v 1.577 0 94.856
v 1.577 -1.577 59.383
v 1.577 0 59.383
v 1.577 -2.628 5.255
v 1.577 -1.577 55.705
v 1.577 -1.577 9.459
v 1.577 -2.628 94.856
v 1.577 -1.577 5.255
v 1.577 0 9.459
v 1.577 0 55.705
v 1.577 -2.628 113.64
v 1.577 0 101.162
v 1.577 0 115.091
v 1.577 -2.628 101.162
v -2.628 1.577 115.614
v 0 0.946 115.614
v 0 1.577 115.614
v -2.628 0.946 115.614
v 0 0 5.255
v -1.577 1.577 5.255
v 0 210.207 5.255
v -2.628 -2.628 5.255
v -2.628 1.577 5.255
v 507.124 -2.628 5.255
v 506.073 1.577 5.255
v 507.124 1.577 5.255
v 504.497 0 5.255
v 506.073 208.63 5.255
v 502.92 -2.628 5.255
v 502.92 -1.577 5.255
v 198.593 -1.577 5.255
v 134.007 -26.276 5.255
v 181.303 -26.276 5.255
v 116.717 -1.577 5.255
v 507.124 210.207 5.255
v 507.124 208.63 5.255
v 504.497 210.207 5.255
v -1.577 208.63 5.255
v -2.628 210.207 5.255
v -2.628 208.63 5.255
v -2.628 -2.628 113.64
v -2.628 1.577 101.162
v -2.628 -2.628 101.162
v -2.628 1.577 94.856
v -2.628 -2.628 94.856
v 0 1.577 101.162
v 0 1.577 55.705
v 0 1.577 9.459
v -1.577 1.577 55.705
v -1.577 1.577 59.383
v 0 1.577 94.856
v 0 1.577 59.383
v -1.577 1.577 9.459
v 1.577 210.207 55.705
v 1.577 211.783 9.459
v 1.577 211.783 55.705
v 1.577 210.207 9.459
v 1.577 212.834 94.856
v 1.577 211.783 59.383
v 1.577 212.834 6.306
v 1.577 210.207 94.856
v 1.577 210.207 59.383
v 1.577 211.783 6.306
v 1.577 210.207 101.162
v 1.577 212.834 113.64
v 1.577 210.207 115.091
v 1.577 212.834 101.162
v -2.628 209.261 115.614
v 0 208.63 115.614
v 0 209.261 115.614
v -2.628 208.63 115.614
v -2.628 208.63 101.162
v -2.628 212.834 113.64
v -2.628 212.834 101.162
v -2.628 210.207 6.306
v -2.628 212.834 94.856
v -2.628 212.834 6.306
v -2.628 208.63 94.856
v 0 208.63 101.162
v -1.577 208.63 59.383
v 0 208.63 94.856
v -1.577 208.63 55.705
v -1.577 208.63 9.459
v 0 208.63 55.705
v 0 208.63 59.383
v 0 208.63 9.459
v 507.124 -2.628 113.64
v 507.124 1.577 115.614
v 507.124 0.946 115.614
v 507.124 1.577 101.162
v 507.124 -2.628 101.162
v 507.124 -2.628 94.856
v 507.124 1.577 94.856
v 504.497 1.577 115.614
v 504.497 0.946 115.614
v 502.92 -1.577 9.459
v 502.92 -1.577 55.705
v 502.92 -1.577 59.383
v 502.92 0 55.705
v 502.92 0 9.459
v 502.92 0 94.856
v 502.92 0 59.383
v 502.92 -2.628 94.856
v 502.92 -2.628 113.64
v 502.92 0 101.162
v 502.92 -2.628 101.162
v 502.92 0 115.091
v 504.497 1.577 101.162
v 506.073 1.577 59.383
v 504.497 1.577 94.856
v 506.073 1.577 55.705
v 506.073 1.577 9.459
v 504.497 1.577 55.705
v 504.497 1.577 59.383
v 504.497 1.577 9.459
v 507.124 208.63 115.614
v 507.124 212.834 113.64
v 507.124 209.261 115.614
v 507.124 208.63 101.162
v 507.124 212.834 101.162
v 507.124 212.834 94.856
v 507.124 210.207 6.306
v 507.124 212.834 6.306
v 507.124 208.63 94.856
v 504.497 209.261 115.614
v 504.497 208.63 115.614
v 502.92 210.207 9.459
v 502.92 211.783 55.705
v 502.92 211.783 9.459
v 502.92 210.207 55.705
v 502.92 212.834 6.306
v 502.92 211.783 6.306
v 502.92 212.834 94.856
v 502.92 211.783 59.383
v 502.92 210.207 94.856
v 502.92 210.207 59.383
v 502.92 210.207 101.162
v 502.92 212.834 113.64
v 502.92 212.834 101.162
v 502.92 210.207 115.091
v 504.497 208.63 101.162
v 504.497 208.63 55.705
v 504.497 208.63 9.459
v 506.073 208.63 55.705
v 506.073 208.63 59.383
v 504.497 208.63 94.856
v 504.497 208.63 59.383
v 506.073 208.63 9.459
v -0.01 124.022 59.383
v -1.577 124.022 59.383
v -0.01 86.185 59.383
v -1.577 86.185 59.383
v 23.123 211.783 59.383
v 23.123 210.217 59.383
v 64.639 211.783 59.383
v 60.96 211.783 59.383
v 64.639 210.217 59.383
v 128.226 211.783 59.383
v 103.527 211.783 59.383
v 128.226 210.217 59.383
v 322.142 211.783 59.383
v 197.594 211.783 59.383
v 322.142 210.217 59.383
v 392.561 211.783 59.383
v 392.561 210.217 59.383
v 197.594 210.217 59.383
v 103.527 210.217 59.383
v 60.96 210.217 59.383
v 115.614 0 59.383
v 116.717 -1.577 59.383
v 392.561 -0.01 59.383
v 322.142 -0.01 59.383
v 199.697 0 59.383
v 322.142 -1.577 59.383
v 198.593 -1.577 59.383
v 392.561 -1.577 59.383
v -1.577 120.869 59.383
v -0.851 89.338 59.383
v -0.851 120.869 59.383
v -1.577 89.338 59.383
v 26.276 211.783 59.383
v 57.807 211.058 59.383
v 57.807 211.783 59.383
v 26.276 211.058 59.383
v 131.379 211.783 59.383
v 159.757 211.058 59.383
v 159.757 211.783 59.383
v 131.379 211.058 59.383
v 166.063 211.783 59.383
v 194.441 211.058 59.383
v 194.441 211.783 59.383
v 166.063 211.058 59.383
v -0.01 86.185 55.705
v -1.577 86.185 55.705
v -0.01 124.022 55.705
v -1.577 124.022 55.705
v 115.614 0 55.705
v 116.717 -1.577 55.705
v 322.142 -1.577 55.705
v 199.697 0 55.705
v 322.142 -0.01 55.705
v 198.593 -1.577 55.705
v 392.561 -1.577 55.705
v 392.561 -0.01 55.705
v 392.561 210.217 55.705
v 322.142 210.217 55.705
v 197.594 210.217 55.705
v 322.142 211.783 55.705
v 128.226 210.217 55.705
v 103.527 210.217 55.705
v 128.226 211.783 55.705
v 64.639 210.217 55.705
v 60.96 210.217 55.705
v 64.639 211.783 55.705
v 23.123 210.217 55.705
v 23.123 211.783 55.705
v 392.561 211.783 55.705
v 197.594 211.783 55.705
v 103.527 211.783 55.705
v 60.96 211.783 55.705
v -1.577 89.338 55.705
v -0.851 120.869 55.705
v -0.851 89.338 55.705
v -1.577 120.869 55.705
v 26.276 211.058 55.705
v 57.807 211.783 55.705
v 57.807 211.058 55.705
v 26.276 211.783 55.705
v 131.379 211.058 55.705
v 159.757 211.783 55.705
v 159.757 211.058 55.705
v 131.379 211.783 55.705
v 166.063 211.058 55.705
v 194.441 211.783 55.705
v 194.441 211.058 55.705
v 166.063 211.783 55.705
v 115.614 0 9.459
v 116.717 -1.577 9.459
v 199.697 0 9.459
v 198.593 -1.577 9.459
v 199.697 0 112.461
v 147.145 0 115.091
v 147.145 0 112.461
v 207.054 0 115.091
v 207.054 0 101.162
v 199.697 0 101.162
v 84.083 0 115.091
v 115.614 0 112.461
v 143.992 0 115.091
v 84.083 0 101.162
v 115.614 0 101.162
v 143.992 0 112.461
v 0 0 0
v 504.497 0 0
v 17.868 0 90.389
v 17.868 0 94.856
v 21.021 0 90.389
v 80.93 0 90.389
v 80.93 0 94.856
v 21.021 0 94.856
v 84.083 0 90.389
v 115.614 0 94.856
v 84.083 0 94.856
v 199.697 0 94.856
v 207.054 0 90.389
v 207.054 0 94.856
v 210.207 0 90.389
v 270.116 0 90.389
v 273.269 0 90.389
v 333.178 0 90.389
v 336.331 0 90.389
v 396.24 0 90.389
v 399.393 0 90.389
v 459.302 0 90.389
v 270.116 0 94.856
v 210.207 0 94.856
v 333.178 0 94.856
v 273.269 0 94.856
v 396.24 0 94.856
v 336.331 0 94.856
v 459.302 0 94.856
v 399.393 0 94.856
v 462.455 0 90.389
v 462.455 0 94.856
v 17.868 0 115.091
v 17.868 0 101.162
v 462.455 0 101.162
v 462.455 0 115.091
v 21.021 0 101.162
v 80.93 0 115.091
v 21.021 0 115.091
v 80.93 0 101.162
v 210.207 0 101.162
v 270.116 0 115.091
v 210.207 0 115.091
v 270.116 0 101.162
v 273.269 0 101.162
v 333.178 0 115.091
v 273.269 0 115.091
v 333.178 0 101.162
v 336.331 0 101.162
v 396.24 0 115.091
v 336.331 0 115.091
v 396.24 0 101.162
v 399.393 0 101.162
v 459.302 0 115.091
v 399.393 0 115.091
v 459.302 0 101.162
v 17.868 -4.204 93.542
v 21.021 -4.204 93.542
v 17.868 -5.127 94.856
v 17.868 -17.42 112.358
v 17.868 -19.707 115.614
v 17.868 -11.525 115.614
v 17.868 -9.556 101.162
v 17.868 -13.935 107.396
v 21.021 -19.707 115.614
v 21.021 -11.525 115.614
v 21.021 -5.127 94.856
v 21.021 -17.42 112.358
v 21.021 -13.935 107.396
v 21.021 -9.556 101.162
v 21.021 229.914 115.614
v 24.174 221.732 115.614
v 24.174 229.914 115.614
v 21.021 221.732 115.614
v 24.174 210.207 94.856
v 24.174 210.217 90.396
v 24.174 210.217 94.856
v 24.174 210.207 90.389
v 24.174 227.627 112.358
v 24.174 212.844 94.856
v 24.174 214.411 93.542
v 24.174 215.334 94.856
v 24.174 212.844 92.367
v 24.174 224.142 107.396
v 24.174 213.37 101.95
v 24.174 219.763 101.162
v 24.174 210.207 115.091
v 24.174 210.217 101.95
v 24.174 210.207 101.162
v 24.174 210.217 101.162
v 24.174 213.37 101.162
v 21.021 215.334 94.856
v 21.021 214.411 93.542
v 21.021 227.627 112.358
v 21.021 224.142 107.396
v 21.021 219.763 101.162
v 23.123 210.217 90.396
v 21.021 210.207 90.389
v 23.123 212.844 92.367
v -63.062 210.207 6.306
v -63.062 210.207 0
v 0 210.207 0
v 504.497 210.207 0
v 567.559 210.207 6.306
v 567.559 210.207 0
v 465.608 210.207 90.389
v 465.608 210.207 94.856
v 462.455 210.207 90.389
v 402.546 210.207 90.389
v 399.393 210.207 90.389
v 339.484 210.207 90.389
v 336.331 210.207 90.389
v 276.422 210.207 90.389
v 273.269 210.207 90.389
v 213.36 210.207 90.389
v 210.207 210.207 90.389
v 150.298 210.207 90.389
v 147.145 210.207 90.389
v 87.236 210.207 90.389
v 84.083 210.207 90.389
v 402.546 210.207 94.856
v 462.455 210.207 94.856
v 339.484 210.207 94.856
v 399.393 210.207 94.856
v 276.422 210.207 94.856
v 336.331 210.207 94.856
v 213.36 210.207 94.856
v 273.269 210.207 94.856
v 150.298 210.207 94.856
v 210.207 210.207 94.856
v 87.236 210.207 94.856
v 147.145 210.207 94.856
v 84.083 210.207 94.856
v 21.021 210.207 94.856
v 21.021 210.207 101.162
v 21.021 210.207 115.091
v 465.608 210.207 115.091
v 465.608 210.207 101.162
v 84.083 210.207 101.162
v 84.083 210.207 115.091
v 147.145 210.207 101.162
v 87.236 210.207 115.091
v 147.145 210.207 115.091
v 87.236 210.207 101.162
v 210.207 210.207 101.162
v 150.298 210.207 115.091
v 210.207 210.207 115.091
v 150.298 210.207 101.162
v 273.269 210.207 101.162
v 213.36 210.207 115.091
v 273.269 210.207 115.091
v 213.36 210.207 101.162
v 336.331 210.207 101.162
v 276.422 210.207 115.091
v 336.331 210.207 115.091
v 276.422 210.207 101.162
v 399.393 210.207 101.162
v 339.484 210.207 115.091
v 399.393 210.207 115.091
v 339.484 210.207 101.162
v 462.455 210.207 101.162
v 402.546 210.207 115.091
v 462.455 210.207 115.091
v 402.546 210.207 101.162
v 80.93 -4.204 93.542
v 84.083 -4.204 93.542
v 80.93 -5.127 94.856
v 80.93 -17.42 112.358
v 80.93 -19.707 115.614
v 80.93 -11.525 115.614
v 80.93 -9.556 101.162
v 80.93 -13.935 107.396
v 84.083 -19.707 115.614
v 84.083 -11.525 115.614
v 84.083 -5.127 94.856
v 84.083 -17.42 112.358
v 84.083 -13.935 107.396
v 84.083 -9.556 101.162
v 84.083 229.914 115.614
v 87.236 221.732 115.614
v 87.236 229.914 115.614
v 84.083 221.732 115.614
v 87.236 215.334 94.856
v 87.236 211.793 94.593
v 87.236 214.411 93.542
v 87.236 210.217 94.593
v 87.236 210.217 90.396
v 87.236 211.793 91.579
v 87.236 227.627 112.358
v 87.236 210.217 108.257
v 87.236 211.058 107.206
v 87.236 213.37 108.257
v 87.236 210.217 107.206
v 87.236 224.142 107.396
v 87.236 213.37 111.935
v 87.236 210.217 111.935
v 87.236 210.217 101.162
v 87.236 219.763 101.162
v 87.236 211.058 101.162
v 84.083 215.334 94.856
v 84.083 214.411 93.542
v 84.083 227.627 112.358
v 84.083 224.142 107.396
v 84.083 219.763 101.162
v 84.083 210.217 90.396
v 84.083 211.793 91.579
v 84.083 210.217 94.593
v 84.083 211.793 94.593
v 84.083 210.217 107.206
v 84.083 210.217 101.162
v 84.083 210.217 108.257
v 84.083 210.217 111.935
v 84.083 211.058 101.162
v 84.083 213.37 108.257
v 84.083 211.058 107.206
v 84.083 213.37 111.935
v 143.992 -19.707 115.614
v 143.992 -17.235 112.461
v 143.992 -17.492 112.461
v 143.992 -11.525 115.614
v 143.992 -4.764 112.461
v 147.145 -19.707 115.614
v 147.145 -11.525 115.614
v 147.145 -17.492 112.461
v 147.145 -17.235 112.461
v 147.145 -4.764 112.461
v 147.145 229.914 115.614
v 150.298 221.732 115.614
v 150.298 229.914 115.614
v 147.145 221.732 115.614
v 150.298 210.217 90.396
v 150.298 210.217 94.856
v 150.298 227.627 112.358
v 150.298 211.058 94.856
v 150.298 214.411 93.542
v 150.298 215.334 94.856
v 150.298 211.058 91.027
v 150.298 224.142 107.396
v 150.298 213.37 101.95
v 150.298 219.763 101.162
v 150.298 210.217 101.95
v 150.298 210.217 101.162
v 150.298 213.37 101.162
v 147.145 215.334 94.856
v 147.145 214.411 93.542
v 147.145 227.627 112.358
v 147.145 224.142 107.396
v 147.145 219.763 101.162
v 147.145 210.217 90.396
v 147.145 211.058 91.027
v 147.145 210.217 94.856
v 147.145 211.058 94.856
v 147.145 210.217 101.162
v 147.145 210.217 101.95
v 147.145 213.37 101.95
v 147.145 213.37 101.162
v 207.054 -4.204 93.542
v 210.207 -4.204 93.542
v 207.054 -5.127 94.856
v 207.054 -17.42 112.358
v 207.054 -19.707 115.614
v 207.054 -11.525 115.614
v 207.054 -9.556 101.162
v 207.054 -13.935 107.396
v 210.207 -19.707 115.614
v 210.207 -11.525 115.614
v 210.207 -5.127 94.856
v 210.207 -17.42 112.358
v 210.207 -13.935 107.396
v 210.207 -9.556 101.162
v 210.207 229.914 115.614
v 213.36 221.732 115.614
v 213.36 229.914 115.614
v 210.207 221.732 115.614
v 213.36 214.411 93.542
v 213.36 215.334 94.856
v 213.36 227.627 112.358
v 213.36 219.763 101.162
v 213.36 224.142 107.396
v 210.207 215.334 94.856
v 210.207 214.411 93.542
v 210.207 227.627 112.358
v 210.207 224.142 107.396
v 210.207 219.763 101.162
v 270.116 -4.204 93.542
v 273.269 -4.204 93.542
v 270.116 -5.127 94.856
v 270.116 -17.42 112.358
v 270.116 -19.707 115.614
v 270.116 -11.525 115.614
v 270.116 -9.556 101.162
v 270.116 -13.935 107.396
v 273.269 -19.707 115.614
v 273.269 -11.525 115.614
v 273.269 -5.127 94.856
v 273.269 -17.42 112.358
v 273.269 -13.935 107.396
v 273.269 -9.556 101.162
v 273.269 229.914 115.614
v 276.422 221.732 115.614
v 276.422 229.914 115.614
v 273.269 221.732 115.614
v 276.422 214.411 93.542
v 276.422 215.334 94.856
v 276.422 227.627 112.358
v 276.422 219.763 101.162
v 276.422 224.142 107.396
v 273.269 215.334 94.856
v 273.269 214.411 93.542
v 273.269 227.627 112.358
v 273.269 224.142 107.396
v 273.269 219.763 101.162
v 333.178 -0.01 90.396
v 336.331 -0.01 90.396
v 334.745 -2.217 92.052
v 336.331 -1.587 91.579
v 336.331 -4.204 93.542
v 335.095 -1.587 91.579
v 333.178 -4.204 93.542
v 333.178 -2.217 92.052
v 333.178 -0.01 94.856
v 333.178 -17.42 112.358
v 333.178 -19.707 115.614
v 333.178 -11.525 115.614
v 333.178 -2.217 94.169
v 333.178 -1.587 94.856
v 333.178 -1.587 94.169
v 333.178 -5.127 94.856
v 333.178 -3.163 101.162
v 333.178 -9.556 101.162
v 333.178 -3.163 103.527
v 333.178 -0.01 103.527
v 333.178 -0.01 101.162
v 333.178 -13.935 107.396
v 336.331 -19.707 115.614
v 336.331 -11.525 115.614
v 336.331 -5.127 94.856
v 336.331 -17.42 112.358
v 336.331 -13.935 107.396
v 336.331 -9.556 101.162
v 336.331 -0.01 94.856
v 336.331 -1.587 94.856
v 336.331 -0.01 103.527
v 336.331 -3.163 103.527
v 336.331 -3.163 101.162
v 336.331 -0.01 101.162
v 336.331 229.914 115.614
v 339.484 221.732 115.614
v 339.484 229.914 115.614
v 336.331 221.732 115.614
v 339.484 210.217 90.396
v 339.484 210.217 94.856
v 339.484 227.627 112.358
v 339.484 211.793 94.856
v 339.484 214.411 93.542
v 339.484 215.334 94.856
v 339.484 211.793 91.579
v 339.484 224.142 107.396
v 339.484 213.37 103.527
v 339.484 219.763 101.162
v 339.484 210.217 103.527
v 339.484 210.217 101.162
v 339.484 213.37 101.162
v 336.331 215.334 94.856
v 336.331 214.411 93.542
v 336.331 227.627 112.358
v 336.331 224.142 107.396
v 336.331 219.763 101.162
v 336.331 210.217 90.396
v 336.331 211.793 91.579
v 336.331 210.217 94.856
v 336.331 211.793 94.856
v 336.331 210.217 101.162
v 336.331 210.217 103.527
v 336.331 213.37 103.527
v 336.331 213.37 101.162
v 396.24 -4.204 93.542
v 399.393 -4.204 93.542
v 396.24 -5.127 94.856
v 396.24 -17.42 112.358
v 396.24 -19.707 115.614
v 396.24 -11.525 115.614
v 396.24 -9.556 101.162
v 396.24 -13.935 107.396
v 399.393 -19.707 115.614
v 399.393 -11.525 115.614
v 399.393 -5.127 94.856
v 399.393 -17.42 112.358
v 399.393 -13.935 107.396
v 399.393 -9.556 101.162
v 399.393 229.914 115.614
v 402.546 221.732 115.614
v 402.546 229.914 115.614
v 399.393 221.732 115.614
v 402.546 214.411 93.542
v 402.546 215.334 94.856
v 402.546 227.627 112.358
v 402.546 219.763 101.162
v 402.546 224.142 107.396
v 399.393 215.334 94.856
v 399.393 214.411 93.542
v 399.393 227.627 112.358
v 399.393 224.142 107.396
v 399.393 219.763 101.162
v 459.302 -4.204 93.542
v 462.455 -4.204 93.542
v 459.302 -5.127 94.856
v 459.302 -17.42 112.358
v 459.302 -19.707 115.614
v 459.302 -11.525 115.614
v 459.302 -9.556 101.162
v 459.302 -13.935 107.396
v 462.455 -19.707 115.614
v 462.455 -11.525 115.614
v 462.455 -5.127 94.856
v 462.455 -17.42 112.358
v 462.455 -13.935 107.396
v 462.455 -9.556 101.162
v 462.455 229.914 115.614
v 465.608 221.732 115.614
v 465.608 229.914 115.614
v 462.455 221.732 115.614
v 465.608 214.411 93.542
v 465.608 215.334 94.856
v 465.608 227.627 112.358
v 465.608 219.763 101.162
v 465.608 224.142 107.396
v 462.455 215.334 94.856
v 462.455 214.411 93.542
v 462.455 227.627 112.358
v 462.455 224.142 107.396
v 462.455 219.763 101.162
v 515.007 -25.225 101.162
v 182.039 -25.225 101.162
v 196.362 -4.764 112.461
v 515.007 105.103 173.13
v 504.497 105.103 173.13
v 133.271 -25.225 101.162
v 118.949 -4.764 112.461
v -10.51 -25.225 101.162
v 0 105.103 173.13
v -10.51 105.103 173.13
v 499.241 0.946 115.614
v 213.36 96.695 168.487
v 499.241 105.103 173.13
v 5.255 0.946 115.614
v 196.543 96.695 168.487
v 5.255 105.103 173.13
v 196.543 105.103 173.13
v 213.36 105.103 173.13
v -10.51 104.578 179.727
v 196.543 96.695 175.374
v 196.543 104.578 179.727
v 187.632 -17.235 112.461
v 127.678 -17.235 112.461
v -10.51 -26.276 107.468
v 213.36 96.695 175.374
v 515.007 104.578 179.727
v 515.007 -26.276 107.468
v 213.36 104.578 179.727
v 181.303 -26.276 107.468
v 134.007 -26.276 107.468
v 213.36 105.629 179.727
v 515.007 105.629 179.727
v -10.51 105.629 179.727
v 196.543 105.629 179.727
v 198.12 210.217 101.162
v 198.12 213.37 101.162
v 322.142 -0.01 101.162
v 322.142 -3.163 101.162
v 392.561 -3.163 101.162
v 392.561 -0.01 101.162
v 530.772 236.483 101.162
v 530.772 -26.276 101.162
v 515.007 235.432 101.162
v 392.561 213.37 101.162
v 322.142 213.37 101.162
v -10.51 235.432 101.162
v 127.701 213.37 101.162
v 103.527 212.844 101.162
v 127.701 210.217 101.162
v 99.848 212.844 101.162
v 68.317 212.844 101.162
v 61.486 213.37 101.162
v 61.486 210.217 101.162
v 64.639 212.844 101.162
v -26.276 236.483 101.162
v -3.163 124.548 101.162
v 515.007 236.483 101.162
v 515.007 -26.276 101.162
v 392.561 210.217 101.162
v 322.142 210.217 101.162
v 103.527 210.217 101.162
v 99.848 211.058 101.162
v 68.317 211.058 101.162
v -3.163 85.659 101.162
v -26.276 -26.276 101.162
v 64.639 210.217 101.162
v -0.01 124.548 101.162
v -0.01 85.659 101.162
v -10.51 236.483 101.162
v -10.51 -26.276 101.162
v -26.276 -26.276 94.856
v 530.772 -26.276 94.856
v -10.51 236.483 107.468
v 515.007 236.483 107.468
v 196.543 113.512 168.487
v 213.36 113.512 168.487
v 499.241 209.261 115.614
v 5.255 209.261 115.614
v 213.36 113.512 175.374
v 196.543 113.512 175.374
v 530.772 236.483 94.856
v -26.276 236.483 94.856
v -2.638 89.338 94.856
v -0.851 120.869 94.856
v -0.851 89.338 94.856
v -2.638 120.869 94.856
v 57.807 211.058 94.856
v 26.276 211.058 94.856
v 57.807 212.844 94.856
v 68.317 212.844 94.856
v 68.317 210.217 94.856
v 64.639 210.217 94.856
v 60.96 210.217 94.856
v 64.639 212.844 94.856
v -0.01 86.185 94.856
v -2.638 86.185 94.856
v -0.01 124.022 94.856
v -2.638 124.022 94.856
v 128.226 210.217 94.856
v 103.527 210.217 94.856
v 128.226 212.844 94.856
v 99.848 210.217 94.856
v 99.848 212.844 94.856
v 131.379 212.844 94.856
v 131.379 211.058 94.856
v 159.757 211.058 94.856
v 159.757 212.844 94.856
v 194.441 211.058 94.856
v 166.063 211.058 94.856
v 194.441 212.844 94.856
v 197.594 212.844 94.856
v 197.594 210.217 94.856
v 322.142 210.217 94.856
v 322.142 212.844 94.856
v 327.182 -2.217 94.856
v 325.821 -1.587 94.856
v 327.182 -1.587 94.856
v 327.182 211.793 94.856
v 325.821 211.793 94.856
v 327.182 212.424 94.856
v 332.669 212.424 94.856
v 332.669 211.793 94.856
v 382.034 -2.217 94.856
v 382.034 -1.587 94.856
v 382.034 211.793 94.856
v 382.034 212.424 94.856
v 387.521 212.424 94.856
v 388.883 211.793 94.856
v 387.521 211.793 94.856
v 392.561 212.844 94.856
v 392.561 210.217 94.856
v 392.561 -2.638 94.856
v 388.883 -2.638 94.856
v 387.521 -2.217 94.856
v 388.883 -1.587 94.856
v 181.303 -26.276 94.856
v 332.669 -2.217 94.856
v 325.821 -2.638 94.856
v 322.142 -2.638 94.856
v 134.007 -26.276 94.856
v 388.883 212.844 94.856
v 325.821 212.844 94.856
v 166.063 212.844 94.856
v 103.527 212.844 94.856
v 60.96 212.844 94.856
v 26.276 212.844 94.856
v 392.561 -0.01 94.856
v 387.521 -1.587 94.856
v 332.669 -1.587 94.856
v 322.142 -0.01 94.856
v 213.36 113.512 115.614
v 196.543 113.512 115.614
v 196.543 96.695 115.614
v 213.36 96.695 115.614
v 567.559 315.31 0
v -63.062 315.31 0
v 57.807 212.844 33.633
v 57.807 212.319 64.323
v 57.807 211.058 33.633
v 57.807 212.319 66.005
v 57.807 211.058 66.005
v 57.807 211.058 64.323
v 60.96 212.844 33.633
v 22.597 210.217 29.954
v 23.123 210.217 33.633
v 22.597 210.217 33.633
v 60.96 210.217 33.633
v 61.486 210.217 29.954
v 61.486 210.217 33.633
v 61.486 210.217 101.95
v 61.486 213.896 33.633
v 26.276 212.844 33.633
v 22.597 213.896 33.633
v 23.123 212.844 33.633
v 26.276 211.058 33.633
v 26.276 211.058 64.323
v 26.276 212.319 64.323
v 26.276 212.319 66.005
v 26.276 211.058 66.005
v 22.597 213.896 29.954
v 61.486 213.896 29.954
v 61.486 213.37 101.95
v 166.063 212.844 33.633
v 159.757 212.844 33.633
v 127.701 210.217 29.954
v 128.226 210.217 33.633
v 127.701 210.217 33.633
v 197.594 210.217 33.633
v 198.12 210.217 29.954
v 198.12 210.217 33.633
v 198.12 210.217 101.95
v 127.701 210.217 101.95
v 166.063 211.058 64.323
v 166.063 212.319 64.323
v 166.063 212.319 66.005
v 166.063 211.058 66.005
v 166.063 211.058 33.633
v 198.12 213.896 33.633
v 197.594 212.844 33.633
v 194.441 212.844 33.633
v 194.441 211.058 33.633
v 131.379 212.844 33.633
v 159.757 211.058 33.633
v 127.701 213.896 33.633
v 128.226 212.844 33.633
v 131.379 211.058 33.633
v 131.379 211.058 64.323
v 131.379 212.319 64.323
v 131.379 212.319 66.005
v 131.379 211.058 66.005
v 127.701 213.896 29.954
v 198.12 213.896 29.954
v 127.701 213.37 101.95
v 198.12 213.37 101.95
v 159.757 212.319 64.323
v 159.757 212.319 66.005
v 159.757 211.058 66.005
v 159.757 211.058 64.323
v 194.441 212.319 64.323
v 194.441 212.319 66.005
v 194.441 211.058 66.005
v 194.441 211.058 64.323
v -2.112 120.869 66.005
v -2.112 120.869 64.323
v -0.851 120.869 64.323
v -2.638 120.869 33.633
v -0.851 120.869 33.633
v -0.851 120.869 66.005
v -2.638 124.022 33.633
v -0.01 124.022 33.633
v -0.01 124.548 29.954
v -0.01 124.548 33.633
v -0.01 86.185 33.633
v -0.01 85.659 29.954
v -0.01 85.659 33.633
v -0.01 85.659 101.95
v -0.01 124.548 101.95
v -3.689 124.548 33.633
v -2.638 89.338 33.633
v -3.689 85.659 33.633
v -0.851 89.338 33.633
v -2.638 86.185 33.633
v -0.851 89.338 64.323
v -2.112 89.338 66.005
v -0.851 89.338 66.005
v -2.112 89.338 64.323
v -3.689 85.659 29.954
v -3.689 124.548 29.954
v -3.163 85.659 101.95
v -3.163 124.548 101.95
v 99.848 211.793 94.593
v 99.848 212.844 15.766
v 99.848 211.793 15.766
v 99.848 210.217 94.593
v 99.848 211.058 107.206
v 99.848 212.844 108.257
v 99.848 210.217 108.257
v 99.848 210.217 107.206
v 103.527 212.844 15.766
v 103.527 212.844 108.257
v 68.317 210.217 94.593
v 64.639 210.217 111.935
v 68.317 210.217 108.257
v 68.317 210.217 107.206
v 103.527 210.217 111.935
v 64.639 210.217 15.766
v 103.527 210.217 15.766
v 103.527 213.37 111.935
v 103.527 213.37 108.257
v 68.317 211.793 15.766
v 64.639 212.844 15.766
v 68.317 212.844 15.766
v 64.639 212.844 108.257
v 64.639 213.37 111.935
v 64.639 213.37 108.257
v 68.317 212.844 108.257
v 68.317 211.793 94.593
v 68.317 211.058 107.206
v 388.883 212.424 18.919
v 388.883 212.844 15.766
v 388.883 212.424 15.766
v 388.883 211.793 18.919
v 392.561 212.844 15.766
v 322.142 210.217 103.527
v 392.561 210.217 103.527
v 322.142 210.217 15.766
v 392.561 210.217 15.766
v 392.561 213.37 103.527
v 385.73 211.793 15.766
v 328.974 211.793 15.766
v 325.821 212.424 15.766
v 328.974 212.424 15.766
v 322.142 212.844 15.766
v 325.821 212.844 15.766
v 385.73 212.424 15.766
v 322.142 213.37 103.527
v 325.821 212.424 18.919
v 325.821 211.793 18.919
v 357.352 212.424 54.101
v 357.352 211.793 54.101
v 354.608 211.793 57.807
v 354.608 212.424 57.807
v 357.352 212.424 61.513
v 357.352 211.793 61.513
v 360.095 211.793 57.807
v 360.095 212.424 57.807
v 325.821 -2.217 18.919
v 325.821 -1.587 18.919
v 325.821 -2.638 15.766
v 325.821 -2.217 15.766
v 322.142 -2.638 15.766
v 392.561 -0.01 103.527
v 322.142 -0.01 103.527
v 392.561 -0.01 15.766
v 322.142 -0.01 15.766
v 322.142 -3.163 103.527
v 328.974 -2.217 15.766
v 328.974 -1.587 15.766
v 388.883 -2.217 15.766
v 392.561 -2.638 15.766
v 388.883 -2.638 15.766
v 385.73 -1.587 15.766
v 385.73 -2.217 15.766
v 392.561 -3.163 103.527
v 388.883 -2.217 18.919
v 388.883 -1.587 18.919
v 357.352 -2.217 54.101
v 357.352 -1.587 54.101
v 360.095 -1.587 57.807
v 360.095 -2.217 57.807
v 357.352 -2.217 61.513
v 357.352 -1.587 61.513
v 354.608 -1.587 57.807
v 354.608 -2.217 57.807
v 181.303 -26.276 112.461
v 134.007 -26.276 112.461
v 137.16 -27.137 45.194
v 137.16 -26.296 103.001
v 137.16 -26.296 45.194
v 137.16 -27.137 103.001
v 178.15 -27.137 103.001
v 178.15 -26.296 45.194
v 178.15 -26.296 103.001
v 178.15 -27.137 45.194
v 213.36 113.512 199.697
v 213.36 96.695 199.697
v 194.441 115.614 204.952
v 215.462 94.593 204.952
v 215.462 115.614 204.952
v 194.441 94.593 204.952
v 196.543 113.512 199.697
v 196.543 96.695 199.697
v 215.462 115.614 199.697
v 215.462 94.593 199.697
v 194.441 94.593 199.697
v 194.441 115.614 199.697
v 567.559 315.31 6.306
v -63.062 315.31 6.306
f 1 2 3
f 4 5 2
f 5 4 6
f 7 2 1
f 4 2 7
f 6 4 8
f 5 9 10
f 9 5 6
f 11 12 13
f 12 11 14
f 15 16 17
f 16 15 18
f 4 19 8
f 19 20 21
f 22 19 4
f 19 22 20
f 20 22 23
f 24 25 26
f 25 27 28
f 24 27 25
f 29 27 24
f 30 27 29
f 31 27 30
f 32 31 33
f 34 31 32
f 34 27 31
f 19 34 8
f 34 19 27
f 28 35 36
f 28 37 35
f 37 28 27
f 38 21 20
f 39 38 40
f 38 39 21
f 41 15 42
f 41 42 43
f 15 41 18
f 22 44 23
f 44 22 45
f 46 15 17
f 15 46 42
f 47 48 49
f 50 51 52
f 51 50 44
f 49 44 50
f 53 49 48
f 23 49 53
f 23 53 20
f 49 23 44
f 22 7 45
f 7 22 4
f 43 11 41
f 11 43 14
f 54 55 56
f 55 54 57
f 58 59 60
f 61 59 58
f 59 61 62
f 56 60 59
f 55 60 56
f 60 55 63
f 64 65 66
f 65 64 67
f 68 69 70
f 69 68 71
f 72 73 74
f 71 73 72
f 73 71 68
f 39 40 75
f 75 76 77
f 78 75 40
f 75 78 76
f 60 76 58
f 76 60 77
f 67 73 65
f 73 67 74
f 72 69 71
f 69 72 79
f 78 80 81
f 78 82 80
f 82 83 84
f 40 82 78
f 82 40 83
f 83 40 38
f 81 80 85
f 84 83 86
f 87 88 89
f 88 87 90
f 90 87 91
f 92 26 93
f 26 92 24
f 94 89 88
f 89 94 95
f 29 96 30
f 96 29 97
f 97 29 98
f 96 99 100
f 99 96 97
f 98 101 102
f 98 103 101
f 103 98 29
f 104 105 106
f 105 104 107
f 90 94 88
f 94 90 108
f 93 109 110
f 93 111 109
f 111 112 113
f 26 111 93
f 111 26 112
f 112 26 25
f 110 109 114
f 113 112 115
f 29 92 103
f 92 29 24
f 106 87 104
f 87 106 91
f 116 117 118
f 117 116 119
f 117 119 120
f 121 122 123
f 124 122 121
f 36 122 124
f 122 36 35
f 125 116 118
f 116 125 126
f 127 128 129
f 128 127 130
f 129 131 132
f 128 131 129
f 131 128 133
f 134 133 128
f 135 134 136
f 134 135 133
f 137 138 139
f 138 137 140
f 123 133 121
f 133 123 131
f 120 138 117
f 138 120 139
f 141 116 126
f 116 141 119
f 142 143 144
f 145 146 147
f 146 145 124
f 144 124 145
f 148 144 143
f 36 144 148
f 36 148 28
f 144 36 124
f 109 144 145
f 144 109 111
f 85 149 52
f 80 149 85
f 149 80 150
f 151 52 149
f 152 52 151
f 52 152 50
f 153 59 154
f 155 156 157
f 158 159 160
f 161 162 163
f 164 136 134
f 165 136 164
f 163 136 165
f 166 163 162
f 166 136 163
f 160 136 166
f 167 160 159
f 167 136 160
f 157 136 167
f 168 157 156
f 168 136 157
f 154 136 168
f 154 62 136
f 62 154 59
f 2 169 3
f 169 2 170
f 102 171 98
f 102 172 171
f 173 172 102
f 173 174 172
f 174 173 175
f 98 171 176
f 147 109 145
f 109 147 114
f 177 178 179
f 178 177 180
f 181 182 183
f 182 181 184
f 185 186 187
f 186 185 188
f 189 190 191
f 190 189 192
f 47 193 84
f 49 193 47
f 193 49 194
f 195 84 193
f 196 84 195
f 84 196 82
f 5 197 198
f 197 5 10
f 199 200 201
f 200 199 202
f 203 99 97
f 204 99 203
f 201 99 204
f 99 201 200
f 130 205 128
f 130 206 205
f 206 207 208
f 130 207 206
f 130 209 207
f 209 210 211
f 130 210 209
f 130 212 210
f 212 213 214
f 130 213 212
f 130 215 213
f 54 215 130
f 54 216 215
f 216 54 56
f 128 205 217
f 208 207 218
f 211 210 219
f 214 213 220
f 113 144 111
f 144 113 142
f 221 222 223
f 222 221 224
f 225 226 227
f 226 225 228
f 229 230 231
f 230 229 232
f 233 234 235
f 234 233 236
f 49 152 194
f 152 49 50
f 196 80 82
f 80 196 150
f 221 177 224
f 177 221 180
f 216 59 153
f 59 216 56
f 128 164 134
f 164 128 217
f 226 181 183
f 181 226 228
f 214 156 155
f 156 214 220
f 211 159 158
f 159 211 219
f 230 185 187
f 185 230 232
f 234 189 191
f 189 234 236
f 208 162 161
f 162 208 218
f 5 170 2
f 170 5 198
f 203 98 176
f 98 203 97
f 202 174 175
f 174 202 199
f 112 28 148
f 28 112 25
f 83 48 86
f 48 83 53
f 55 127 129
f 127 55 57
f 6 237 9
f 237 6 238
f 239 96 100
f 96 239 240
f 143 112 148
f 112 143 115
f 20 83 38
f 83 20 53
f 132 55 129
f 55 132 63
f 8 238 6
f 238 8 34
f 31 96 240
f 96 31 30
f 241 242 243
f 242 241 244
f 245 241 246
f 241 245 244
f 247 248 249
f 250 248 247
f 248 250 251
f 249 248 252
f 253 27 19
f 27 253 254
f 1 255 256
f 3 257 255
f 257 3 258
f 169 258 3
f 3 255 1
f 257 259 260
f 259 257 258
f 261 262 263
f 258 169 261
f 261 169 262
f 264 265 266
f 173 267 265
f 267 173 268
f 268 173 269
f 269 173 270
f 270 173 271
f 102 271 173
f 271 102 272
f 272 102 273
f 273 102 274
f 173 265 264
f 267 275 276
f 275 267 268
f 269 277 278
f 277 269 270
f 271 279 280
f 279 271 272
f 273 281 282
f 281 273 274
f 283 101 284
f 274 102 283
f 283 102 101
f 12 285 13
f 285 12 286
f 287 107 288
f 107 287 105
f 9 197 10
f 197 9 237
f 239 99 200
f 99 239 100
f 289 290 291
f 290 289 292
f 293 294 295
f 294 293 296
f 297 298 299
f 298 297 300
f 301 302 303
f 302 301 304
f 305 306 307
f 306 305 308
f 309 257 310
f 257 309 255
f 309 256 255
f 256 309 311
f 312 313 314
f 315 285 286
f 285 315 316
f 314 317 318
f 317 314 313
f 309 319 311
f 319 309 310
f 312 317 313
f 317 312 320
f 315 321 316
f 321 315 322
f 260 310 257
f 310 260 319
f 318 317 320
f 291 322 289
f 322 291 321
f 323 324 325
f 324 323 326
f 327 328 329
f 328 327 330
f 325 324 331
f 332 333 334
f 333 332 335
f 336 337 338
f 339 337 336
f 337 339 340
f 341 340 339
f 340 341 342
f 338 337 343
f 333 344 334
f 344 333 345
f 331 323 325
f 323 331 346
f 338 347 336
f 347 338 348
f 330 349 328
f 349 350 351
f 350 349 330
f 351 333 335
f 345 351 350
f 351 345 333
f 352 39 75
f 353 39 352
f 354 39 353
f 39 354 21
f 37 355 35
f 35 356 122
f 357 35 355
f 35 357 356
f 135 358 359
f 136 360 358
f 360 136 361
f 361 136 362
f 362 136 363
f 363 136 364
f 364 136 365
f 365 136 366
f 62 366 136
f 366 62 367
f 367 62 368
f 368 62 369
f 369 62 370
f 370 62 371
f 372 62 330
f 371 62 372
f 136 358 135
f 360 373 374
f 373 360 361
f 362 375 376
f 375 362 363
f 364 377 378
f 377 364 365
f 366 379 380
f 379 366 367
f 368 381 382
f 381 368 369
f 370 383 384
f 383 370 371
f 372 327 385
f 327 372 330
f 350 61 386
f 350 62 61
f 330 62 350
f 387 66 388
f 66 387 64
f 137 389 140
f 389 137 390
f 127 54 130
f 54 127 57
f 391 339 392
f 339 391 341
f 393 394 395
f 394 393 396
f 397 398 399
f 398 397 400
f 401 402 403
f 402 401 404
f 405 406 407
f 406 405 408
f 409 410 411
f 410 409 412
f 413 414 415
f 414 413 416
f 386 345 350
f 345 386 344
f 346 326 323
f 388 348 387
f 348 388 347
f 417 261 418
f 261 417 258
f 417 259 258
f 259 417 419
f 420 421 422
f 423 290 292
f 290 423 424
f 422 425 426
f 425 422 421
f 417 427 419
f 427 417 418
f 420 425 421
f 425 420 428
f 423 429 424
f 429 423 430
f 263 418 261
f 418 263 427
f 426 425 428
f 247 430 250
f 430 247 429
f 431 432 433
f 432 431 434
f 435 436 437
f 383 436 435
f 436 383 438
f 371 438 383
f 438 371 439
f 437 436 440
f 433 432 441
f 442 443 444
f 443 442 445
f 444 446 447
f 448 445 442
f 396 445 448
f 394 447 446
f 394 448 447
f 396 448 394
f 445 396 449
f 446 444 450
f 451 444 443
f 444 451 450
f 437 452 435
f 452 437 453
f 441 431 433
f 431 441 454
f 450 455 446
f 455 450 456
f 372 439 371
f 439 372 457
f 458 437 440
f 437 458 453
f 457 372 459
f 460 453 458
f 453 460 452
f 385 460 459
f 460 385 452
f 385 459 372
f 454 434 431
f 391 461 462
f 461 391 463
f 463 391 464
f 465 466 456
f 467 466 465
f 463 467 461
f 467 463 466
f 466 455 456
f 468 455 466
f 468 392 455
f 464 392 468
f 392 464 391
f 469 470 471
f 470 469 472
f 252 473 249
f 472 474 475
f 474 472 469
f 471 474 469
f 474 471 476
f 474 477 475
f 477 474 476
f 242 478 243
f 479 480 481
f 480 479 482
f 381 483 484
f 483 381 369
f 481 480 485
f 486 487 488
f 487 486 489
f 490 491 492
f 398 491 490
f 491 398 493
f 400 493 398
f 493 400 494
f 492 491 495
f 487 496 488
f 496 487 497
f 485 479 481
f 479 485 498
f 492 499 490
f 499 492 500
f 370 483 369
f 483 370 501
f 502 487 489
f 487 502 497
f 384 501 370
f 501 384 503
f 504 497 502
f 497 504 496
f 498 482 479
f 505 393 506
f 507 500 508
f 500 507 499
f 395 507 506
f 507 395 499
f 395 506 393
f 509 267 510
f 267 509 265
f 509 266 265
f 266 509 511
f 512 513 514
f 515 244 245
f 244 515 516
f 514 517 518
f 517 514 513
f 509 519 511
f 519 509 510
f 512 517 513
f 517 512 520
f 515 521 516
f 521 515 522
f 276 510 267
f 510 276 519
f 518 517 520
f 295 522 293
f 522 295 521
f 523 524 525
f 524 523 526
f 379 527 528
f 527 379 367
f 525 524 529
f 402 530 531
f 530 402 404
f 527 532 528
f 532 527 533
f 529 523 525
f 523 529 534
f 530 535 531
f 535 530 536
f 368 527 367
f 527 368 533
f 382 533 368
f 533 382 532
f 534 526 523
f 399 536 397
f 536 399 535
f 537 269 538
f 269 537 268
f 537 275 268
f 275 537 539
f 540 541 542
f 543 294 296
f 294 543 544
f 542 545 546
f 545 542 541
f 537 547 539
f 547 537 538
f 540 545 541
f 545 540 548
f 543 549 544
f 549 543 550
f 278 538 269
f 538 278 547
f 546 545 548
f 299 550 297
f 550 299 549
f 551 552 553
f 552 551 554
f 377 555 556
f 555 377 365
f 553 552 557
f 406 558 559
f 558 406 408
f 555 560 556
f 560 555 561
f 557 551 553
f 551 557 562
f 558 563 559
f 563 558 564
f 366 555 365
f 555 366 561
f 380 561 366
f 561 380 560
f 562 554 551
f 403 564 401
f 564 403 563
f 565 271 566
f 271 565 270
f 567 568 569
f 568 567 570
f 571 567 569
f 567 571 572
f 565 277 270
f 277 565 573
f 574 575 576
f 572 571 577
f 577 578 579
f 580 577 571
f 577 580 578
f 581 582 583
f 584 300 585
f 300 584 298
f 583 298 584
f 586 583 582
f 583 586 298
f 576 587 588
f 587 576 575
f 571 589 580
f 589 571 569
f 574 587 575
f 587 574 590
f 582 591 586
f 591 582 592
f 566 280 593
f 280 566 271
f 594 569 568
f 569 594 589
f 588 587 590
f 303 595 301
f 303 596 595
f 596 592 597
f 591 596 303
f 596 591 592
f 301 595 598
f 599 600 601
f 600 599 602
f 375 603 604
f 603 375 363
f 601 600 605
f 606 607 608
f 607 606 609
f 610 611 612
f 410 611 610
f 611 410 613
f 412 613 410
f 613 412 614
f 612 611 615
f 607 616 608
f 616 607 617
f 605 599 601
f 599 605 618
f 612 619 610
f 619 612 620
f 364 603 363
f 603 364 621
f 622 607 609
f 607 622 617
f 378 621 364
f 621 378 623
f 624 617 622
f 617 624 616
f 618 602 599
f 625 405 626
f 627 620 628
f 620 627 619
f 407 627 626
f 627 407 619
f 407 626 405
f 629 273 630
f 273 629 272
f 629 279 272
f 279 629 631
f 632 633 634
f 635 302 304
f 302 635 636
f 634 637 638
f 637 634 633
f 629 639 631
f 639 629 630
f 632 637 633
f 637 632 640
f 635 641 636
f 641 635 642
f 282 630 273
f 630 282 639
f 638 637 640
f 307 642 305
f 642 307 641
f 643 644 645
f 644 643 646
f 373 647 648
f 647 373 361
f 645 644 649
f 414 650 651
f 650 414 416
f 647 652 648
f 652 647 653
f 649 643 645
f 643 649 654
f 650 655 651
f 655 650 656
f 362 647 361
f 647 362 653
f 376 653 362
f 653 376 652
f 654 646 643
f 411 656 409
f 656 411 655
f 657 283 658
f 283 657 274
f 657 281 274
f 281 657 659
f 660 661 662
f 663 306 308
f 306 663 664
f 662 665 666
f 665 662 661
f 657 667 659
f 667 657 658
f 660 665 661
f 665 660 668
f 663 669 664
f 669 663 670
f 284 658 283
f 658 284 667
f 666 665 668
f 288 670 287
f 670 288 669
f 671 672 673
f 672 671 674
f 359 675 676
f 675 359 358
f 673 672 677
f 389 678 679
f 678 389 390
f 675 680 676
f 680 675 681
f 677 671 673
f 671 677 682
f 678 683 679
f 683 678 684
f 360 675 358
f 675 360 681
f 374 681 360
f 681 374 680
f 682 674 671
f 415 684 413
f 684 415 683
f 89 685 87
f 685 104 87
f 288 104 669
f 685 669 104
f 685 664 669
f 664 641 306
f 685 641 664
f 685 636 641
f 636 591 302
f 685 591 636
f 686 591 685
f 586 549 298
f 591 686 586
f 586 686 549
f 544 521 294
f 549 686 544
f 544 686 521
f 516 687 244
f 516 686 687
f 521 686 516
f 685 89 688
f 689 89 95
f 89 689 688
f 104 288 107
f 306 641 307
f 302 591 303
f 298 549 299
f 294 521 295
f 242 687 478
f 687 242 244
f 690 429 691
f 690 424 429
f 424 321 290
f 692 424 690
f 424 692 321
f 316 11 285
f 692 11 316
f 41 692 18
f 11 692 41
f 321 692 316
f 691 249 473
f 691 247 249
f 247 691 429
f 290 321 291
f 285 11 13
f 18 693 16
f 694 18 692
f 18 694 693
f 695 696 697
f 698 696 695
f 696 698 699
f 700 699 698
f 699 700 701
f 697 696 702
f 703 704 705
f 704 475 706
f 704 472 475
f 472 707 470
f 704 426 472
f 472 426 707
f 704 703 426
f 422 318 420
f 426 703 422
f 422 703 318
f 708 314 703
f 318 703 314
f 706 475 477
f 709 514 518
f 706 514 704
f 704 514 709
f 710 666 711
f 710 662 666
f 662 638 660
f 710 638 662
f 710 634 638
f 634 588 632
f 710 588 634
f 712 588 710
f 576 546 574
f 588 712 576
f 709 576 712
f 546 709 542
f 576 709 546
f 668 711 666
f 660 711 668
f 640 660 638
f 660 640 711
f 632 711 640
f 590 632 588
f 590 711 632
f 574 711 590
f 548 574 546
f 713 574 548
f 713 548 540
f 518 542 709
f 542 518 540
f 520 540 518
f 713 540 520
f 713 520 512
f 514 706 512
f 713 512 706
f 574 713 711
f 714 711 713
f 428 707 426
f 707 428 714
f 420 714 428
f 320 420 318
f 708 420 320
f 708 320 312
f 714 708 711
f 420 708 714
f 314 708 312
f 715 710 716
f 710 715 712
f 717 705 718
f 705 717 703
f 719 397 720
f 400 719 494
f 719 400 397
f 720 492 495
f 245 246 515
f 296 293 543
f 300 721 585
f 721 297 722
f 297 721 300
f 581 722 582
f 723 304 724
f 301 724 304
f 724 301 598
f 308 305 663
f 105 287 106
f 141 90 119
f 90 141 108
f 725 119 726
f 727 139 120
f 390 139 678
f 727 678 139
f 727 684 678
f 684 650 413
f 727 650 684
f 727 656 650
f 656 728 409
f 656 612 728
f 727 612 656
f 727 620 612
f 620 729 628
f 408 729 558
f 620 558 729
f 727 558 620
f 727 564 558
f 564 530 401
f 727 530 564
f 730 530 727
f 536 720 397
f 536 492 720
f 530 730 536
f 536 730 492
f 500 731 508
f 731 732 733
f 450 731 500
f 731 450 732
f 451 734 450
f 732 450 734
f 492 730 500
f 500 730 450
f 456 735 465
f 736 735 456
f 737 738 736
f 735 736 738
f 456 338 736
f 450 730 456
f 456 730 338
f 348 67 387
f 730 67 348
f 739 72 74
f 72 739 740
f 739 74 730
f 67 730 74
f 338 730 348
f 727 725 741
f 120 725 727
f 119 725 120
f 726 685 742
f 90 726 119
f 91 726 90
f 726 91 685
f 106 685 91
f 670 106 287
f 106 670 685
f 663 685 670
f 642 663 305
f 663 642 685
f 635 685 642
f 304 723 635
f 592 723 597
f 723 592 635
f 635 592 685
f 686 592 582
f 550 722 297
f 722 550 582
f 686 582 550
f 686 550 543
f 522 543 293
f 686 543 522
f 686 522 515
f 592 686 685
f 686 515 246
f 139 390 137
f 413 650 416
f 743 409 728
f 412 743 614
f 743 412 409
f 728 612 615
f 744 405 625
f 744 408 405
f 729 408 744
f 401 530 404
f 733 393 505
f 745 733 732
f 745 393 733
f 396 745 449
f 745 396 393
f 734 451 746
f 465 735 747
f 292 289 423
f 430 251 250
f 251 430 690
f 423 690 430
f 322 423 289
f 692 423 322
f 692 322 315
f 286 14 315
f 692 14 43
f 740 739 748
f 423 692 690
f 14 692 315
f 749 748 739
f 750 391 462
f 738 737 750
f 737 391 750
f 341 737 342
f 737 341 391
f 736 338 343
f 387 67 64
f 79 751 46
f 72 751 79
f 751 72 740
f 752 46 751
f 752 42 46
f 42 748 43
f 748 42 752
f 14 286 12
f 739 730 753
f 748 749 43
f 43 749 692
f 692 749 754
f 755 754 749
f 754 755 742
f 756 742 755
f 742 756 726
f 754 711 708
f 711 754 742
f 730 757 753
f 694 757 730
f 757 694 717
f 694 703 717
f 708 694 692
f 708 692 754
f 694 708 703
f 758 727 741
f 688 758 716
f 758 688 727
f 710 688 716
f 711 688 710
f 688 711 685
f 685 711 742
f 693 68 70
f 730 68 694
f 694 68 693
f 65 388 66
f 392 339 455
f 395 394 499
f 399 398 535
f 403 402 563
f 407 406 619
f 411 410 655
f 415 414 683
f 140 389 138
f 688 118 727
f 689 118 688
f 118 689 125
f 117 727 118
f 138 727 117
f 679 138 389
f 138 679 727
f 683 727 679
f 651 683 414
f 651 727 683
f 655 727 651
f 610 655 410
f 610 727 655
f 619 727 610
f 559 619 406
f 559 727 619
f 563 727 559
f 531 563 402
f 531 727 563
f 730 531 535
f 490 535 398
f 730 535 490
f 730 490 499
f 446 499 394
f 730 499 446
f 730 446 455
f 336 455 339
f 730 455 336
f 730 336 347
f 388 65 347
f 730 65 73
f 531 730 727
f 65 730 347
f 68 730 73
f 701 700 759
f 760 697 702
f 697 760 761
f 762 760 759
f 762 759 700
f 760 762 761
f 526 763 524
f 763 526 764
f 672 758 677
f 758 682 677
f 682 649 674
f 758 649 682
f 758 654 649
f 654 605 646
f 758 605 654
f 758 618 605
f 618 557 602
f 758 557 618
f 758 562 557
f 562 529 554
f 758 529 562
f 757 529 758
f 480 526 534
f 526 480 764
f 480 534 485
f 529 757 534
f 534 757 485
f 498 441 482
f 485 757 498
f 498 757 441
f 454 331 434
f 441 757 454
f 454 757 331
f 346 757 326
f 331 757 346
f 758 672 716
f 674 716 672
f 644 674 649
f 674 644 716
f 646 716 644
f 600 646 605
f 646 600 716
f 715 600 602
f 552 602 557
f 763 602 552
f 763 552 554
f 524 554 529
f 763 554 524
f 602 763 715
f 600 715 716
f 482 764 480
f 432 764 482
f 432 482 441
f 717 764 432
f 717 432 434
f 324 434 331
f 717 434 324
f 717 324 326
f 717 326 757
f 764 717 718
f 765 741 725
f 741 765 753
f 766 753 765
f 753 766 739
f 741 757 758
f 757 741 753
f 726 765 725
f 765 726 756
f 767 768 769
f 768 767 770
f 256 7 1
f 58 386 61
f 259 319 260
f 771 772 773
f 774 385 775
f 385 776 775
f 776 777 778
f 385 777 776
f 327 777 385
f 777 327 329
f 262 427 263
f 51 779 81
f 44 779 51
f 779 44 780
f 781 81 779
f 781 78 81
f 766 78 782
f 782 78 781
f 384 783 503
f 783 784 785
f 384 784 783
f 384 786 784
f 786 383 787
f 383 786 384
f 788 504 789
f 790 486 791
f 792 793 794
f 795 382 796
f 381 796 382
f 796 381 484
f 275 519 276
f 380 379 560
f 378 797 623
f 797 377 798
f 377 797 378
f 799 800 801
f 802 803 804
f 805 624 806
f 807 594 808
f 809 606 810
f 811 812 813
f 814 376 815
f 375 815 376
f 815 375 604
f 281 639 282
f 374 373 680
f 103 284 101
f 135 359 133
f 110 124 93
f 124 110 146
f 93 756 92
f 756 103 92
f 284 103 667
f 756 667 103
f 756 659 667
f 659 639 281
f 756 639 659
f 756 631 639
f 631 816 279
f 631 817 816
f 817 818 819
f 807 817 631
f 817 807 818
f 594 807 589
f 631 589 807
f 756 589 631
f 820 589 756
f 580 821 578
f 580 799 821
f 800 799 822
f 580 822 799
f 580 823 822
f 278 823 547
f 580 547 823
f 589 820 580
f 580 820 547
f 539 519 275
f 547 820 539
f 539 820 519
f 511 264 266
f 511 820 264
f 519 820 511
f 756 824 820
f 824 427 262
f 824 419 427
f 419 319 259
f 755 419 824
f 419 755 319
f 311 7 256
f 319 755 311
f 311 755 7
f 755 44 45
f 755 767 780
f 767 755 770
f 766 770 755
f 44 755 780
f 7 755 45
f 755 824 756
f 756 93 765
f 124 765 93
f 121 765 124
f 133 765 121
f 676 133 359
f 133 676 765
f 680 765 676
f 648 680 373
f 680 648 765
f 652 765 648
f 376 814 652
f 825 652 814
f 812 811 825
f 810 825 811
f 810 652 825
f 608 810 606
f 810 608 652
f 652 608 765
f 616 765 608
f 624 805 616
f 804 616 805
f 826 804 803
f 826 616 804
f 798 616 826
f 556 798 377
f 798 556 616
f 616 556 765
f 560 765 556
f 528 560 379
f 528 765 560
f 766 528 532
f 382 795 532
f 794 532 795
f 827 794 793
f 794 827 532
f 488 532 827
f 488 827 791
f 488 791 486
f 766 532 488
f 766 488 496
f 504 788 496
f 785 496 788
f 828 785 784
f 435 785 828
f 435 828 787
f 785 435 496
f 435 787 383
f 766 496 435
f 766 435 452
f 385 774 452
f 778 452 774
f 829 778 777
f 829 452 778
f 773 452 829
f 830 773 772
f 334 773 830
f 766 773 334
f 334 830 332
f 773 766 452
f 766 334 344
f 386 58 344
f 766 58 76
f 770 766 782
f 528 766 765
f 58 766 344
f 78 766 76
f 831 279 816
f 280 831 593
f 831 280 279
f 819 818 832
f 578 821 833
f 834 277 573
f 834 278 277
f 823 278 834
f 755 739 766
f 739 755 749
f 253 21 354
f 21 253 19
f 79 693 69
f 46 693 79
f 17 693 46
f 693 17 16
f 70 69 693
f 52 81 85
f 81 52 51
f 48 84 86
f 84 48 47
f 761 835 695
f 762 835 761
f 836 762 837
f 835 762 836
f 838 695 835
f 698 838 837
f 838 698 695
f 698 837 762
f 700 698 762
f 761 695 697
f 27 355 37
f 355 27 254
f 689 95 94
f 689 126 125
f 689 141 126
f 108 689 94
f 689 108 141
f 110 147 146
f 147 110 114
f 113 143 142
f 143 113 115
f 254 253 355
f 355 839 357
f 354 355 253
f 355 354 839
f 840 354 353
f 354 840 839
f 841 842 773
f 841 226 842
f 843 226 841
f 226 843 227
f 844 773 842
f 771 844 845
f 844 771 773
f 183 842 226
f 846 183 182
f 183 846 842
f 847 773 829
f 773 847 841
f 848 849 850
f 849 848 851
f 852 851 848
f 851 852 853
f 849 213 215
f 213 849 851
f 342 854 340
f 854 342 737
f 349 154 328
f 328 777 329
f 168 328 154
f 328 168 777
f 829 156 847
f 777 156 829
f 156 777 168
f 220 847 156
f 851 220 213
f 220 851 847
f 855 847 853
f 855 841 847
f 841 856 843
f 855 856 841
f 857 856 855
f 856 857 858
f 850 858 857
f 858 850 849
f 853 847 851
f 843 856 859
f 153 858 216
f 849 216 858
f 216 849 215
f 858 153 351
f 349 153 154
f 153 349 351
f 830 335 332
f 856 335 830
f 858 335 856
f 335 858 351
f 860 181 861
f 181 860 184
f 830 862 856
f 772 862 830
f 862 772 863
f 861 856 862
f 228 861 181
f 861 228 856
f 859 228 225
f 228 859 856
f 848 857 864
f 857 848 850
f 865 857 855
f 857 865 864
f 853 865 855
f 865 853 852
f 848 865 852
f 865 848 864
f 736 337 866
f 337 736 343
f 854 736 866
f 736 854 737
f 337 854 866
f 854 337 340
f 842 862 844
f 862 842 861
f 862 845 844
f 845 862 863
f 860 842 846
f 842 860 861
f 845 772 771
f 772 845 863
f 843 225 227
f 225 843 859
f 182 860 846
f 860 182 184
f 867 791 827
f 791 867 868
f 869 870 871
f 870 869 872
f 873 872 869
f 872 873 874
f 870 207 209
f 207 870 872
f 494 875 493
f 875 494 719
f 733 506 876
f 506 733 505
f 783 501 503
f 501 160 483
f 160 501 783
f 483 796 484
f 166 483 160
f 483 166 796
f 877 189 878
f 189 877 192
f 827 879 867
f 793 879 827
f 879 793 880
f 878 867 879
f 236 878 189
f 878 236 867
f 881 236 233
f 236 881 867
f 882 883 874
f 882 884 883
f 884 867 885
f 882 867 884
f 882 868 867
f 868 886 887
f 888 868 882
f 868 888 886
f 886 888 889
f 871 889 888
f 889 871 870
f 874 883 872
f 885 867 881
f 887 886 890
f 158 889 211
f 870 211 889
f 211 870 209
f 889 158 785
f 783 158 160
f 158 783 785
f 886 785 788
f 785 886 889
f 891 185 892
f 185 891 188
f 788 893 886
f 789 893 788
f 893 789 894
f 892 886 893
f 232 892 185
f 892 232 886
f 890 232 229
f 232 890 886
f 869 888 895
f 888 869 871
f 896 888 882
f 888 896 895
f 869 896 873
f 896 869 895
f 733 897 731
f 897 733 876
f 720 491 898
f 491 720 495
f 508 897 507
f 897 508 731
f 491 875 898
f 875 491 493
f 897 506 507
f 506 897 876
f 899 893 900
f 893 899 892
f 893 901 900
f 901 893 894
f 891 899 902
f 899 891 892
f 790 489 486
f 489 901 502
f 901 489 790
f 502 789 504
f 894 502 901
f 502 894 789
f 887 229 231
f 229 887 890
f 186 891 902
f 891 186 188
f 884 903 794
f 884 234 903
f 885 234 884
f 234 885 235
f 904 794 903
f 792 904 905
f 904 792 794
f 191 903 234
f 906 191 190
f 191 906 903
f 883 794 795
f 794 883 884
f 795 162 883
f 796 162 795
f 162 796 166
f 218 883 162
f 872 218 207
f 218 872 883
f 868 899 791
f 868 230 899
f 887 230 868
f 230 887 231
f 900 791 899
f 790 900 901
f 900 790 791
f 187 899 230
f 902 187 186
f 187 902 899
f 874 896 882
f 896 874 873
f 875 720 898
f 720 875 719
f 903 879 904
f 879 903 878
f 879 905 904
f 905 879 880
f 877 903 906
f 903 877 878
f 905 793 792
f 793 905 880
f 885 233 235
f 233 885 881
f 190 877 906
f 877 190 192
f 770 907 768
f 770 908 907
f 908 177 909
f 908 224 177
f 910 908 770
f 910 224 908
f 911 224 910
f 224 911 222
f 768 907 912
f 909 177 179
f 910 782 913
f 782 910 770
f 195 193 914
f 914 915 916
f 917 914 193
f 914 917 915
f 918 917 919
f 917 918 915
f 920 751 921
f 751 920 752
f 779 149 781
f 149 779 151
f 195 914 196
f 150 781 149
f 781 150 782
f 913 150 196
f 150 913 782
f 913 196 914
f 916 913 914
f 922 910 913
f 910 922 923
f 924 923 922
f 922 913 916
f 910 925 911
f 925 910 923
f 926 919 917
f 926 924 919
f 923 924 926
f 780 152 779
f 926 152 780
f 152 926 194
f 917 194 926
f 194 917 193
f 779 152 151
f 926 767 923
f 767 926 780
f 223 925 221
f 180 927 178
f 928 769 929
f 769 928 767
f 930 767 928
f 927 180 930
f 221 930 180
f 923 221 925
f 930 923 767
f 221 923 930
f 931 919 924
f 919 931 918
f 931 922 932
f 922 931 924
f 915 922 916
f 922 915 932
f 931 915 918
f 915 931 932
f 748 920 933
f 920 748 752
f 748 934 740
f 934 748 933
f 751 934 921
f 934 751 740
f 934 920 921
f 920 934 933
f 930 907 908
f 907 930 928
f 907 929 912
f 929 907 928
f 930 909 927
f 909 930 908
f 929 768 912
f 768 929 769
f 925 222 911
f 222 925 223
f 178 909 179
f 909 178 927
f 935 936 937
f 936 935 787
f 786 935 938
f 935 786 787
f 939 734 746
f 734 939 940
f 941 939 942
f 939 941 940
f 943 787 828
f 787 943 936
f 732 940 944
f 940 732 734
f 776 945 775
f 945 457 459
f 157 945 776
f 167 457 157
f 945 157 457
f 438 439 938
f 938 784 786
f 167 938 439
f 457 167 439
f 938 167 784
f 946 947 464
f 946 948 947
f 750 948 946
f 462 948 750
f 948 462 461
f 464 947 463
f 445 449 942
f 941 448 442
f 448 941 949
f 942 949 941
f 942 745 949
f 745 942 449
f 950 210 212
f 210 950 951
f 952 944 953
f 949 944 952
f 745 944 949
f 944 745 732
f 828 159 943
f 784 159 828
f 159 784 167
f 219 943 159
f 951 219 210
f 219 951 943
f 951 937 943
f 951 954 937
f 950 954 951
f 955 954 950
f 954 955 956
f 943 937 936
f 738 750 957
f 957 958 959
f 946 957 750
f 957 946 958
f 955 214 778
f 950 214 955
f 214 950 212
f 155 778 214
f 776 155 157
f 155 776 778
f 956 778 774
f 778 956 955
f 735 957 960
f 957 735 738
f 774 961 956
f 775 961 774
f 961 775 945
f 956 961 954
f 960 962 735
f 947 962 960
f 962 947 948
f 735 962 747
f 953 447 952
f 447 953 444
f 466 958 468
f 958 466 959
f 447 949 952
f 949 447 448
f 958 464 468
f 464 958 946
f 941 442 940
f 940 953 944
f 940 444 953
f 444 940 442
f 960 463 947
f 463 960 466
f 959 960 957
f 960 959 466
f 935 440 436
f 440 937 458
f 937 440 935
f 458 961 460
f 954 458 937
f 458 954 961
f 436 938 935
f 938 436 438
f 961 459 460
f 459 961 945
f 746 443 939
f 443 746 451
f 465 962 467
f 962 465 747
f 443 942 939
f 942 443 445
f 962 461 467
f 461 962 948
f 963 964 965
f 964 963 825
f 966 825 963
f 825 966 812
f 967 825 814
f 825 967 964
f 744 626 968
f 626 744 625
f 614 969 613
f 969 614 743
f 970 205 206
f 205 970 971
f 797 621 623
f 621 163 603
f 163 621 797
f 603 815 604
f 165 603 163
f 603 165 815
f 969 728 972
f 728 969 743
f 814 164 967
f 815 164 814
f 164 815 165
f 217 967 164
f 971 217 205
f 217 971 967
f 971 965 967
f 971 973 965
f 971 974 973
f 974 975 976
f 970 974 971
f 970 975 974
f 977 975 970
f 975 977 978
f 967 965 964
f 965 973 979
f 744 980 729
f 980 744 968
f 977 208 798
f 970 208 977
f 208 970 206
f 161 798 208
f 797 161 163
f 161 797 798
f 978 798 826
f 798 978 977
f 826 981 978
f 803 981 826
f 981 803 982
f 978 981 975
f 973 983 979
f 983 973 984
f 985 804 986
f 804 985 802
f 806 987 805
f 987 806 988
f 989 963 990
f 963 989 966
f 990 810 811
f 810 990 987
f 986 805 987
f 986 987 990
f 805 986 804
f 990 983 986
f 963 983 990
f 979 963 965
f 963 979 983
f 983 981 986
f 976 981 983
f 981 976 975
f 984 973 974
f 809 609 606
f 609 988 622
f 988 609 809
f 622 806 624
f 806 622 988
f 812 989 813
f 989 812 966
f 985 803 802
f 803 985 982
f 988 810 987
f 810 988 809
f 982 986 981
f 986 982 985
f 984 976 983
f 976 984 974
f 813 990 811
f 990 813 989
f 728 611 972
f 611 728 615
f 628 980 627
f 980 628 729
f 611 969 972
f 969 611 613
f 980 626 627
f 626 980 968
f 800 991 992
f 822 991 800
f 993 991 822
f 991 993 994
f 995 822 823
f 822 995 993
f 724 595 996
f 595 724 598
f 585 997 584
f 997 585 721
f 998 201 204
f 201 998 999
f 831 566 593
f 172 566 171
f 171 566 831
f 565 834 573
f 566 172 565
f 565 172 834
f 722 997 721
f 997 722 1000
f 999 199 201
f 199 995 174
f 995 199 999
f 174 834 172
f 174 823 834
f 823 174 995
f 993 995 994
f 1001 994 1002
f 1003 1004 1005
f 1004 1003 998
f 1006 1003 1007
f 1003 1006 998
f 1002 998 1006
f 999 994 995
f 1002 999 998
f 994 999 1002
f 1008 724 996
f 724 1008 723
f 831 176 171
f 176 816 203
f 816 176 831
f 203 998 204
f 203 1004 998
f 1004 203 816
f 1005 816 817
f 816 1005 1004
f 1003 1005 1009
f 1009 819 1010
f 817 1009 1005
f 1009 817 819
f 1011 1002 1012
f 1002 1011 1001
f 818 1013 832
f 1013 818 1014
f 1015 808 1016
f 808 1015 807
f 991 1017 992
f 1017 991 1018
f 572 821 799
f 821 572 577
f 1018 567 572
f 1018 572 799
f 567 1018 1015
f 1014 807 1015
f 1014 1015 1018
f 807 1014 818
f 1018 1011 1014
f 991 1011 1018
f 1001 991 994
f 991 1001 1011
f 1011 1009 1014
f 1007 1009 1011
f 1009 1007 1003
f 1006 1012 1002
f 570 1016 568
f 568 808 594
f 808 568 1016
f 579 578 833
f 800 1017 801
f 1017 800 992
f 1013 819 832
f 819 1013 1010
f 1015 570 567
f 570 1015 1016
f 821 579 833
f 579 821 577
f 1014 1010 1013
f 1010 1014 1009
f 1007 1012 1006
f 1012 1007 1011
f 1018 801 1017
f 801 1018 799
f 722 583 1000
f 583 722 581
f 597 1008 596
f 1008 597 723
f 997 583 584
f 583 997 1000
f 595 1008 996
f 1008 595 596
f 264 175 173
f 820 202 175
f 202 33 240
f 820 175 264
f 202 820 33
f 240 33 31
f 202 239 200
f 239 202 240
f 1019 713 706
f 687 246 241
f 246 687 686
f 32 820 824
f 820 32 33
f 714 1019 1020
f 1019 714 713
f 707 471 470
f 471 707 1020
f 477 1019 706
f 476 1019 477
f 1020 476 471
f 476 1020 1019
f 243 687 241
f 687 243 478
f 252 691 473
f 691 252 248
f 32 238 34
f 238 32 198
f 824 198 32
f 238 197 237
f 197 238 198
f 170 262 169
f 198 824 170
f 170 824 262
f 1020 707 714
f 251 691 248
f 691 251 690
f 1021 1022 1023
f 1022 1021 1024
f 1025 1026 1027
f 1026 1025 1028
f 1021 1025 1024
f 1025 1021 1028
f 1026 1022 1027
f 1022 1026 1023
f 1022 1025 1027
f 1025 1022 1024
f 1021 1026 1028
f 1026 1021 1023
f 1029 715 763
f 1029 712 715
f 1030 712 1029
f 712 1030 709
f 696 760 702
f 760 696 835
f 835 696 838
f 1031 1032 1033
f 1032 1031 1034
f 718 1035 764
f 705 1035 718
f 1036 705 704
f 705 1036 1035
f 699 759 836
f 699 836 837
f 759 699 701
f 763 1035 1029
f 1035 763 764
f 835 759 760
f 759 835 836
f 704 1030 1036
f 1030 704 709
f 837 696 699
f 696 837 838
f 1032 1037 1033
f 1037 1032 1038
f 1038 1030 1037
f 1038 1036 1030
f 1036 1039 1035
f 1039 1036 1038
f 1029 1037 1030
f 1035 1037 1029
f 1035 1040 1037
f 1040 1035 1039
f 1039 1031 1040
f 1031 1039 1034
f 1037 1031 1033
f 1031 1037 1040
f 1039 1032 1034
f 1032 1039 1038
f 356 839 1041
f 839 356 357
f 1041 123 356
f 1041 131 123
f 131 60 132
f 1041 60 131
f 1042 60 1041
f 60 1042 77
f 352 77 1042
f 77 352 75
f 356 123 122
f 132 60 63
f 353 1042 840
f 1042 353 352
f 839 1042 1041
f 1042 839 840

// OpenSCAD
// =====================================================================
//  MILWAUKEE ROAD - STANDARD 20 X 48 FT DEPOT (C.M.&ST.P., NOV 1898)
//  Album of Depot Plans (1919), sheet 05. Private reference (in copyright):
//  Research Library / RSW / Stations / Standard depots / Album of Depot Plans 1919.
//  Rib Side Works, 24 Nov 2026. FIRST SHAPE MODEL for review - not cut into print sections.
//  KNOWN (from the sheet): 20 x 48 ft; waiting room 19 ft 8, office 10 with bay, freight room 27 ft 6; shingle roof, drop siding; built at Summit, Morrisonville, Pierpont.
//  ESTIMATE: wall and ridge heights (sheets are small copies), window spacing, colours.
//  Shared depot builder ../../../_common/rsw_depot.scad (x along the track, y = 0 town side,
//  track side +y, feet).  SCALE: 29 = G, 48 = O, 87 = HO.
// =====================================================================
SCALE = 29;
include <../../../_common/rsw_depot.scad>

depot(blocks = [[0, 48, 0, 20, 11, 0.55, 1, 2.5, 0]],
      pavs   = [],
      wins   = [[4, 1, 3, 6, 3.2], [14, 1, 3, 6, 3.2], [17, 1, 3, 6, 3.2], [10, 2, 3, 6, 3.2]],
      doors  = [[8, 1, 3, 7.5, 0], [34, 1, 6, 8, 2], [34, 0, 6, 8, 2]],
      bays   = [[15, 0, 8, 2.5]],
      chims  = [[19.5, 10, 19.5]],
      plat   = [-6, 60, 10, 0.6]);
